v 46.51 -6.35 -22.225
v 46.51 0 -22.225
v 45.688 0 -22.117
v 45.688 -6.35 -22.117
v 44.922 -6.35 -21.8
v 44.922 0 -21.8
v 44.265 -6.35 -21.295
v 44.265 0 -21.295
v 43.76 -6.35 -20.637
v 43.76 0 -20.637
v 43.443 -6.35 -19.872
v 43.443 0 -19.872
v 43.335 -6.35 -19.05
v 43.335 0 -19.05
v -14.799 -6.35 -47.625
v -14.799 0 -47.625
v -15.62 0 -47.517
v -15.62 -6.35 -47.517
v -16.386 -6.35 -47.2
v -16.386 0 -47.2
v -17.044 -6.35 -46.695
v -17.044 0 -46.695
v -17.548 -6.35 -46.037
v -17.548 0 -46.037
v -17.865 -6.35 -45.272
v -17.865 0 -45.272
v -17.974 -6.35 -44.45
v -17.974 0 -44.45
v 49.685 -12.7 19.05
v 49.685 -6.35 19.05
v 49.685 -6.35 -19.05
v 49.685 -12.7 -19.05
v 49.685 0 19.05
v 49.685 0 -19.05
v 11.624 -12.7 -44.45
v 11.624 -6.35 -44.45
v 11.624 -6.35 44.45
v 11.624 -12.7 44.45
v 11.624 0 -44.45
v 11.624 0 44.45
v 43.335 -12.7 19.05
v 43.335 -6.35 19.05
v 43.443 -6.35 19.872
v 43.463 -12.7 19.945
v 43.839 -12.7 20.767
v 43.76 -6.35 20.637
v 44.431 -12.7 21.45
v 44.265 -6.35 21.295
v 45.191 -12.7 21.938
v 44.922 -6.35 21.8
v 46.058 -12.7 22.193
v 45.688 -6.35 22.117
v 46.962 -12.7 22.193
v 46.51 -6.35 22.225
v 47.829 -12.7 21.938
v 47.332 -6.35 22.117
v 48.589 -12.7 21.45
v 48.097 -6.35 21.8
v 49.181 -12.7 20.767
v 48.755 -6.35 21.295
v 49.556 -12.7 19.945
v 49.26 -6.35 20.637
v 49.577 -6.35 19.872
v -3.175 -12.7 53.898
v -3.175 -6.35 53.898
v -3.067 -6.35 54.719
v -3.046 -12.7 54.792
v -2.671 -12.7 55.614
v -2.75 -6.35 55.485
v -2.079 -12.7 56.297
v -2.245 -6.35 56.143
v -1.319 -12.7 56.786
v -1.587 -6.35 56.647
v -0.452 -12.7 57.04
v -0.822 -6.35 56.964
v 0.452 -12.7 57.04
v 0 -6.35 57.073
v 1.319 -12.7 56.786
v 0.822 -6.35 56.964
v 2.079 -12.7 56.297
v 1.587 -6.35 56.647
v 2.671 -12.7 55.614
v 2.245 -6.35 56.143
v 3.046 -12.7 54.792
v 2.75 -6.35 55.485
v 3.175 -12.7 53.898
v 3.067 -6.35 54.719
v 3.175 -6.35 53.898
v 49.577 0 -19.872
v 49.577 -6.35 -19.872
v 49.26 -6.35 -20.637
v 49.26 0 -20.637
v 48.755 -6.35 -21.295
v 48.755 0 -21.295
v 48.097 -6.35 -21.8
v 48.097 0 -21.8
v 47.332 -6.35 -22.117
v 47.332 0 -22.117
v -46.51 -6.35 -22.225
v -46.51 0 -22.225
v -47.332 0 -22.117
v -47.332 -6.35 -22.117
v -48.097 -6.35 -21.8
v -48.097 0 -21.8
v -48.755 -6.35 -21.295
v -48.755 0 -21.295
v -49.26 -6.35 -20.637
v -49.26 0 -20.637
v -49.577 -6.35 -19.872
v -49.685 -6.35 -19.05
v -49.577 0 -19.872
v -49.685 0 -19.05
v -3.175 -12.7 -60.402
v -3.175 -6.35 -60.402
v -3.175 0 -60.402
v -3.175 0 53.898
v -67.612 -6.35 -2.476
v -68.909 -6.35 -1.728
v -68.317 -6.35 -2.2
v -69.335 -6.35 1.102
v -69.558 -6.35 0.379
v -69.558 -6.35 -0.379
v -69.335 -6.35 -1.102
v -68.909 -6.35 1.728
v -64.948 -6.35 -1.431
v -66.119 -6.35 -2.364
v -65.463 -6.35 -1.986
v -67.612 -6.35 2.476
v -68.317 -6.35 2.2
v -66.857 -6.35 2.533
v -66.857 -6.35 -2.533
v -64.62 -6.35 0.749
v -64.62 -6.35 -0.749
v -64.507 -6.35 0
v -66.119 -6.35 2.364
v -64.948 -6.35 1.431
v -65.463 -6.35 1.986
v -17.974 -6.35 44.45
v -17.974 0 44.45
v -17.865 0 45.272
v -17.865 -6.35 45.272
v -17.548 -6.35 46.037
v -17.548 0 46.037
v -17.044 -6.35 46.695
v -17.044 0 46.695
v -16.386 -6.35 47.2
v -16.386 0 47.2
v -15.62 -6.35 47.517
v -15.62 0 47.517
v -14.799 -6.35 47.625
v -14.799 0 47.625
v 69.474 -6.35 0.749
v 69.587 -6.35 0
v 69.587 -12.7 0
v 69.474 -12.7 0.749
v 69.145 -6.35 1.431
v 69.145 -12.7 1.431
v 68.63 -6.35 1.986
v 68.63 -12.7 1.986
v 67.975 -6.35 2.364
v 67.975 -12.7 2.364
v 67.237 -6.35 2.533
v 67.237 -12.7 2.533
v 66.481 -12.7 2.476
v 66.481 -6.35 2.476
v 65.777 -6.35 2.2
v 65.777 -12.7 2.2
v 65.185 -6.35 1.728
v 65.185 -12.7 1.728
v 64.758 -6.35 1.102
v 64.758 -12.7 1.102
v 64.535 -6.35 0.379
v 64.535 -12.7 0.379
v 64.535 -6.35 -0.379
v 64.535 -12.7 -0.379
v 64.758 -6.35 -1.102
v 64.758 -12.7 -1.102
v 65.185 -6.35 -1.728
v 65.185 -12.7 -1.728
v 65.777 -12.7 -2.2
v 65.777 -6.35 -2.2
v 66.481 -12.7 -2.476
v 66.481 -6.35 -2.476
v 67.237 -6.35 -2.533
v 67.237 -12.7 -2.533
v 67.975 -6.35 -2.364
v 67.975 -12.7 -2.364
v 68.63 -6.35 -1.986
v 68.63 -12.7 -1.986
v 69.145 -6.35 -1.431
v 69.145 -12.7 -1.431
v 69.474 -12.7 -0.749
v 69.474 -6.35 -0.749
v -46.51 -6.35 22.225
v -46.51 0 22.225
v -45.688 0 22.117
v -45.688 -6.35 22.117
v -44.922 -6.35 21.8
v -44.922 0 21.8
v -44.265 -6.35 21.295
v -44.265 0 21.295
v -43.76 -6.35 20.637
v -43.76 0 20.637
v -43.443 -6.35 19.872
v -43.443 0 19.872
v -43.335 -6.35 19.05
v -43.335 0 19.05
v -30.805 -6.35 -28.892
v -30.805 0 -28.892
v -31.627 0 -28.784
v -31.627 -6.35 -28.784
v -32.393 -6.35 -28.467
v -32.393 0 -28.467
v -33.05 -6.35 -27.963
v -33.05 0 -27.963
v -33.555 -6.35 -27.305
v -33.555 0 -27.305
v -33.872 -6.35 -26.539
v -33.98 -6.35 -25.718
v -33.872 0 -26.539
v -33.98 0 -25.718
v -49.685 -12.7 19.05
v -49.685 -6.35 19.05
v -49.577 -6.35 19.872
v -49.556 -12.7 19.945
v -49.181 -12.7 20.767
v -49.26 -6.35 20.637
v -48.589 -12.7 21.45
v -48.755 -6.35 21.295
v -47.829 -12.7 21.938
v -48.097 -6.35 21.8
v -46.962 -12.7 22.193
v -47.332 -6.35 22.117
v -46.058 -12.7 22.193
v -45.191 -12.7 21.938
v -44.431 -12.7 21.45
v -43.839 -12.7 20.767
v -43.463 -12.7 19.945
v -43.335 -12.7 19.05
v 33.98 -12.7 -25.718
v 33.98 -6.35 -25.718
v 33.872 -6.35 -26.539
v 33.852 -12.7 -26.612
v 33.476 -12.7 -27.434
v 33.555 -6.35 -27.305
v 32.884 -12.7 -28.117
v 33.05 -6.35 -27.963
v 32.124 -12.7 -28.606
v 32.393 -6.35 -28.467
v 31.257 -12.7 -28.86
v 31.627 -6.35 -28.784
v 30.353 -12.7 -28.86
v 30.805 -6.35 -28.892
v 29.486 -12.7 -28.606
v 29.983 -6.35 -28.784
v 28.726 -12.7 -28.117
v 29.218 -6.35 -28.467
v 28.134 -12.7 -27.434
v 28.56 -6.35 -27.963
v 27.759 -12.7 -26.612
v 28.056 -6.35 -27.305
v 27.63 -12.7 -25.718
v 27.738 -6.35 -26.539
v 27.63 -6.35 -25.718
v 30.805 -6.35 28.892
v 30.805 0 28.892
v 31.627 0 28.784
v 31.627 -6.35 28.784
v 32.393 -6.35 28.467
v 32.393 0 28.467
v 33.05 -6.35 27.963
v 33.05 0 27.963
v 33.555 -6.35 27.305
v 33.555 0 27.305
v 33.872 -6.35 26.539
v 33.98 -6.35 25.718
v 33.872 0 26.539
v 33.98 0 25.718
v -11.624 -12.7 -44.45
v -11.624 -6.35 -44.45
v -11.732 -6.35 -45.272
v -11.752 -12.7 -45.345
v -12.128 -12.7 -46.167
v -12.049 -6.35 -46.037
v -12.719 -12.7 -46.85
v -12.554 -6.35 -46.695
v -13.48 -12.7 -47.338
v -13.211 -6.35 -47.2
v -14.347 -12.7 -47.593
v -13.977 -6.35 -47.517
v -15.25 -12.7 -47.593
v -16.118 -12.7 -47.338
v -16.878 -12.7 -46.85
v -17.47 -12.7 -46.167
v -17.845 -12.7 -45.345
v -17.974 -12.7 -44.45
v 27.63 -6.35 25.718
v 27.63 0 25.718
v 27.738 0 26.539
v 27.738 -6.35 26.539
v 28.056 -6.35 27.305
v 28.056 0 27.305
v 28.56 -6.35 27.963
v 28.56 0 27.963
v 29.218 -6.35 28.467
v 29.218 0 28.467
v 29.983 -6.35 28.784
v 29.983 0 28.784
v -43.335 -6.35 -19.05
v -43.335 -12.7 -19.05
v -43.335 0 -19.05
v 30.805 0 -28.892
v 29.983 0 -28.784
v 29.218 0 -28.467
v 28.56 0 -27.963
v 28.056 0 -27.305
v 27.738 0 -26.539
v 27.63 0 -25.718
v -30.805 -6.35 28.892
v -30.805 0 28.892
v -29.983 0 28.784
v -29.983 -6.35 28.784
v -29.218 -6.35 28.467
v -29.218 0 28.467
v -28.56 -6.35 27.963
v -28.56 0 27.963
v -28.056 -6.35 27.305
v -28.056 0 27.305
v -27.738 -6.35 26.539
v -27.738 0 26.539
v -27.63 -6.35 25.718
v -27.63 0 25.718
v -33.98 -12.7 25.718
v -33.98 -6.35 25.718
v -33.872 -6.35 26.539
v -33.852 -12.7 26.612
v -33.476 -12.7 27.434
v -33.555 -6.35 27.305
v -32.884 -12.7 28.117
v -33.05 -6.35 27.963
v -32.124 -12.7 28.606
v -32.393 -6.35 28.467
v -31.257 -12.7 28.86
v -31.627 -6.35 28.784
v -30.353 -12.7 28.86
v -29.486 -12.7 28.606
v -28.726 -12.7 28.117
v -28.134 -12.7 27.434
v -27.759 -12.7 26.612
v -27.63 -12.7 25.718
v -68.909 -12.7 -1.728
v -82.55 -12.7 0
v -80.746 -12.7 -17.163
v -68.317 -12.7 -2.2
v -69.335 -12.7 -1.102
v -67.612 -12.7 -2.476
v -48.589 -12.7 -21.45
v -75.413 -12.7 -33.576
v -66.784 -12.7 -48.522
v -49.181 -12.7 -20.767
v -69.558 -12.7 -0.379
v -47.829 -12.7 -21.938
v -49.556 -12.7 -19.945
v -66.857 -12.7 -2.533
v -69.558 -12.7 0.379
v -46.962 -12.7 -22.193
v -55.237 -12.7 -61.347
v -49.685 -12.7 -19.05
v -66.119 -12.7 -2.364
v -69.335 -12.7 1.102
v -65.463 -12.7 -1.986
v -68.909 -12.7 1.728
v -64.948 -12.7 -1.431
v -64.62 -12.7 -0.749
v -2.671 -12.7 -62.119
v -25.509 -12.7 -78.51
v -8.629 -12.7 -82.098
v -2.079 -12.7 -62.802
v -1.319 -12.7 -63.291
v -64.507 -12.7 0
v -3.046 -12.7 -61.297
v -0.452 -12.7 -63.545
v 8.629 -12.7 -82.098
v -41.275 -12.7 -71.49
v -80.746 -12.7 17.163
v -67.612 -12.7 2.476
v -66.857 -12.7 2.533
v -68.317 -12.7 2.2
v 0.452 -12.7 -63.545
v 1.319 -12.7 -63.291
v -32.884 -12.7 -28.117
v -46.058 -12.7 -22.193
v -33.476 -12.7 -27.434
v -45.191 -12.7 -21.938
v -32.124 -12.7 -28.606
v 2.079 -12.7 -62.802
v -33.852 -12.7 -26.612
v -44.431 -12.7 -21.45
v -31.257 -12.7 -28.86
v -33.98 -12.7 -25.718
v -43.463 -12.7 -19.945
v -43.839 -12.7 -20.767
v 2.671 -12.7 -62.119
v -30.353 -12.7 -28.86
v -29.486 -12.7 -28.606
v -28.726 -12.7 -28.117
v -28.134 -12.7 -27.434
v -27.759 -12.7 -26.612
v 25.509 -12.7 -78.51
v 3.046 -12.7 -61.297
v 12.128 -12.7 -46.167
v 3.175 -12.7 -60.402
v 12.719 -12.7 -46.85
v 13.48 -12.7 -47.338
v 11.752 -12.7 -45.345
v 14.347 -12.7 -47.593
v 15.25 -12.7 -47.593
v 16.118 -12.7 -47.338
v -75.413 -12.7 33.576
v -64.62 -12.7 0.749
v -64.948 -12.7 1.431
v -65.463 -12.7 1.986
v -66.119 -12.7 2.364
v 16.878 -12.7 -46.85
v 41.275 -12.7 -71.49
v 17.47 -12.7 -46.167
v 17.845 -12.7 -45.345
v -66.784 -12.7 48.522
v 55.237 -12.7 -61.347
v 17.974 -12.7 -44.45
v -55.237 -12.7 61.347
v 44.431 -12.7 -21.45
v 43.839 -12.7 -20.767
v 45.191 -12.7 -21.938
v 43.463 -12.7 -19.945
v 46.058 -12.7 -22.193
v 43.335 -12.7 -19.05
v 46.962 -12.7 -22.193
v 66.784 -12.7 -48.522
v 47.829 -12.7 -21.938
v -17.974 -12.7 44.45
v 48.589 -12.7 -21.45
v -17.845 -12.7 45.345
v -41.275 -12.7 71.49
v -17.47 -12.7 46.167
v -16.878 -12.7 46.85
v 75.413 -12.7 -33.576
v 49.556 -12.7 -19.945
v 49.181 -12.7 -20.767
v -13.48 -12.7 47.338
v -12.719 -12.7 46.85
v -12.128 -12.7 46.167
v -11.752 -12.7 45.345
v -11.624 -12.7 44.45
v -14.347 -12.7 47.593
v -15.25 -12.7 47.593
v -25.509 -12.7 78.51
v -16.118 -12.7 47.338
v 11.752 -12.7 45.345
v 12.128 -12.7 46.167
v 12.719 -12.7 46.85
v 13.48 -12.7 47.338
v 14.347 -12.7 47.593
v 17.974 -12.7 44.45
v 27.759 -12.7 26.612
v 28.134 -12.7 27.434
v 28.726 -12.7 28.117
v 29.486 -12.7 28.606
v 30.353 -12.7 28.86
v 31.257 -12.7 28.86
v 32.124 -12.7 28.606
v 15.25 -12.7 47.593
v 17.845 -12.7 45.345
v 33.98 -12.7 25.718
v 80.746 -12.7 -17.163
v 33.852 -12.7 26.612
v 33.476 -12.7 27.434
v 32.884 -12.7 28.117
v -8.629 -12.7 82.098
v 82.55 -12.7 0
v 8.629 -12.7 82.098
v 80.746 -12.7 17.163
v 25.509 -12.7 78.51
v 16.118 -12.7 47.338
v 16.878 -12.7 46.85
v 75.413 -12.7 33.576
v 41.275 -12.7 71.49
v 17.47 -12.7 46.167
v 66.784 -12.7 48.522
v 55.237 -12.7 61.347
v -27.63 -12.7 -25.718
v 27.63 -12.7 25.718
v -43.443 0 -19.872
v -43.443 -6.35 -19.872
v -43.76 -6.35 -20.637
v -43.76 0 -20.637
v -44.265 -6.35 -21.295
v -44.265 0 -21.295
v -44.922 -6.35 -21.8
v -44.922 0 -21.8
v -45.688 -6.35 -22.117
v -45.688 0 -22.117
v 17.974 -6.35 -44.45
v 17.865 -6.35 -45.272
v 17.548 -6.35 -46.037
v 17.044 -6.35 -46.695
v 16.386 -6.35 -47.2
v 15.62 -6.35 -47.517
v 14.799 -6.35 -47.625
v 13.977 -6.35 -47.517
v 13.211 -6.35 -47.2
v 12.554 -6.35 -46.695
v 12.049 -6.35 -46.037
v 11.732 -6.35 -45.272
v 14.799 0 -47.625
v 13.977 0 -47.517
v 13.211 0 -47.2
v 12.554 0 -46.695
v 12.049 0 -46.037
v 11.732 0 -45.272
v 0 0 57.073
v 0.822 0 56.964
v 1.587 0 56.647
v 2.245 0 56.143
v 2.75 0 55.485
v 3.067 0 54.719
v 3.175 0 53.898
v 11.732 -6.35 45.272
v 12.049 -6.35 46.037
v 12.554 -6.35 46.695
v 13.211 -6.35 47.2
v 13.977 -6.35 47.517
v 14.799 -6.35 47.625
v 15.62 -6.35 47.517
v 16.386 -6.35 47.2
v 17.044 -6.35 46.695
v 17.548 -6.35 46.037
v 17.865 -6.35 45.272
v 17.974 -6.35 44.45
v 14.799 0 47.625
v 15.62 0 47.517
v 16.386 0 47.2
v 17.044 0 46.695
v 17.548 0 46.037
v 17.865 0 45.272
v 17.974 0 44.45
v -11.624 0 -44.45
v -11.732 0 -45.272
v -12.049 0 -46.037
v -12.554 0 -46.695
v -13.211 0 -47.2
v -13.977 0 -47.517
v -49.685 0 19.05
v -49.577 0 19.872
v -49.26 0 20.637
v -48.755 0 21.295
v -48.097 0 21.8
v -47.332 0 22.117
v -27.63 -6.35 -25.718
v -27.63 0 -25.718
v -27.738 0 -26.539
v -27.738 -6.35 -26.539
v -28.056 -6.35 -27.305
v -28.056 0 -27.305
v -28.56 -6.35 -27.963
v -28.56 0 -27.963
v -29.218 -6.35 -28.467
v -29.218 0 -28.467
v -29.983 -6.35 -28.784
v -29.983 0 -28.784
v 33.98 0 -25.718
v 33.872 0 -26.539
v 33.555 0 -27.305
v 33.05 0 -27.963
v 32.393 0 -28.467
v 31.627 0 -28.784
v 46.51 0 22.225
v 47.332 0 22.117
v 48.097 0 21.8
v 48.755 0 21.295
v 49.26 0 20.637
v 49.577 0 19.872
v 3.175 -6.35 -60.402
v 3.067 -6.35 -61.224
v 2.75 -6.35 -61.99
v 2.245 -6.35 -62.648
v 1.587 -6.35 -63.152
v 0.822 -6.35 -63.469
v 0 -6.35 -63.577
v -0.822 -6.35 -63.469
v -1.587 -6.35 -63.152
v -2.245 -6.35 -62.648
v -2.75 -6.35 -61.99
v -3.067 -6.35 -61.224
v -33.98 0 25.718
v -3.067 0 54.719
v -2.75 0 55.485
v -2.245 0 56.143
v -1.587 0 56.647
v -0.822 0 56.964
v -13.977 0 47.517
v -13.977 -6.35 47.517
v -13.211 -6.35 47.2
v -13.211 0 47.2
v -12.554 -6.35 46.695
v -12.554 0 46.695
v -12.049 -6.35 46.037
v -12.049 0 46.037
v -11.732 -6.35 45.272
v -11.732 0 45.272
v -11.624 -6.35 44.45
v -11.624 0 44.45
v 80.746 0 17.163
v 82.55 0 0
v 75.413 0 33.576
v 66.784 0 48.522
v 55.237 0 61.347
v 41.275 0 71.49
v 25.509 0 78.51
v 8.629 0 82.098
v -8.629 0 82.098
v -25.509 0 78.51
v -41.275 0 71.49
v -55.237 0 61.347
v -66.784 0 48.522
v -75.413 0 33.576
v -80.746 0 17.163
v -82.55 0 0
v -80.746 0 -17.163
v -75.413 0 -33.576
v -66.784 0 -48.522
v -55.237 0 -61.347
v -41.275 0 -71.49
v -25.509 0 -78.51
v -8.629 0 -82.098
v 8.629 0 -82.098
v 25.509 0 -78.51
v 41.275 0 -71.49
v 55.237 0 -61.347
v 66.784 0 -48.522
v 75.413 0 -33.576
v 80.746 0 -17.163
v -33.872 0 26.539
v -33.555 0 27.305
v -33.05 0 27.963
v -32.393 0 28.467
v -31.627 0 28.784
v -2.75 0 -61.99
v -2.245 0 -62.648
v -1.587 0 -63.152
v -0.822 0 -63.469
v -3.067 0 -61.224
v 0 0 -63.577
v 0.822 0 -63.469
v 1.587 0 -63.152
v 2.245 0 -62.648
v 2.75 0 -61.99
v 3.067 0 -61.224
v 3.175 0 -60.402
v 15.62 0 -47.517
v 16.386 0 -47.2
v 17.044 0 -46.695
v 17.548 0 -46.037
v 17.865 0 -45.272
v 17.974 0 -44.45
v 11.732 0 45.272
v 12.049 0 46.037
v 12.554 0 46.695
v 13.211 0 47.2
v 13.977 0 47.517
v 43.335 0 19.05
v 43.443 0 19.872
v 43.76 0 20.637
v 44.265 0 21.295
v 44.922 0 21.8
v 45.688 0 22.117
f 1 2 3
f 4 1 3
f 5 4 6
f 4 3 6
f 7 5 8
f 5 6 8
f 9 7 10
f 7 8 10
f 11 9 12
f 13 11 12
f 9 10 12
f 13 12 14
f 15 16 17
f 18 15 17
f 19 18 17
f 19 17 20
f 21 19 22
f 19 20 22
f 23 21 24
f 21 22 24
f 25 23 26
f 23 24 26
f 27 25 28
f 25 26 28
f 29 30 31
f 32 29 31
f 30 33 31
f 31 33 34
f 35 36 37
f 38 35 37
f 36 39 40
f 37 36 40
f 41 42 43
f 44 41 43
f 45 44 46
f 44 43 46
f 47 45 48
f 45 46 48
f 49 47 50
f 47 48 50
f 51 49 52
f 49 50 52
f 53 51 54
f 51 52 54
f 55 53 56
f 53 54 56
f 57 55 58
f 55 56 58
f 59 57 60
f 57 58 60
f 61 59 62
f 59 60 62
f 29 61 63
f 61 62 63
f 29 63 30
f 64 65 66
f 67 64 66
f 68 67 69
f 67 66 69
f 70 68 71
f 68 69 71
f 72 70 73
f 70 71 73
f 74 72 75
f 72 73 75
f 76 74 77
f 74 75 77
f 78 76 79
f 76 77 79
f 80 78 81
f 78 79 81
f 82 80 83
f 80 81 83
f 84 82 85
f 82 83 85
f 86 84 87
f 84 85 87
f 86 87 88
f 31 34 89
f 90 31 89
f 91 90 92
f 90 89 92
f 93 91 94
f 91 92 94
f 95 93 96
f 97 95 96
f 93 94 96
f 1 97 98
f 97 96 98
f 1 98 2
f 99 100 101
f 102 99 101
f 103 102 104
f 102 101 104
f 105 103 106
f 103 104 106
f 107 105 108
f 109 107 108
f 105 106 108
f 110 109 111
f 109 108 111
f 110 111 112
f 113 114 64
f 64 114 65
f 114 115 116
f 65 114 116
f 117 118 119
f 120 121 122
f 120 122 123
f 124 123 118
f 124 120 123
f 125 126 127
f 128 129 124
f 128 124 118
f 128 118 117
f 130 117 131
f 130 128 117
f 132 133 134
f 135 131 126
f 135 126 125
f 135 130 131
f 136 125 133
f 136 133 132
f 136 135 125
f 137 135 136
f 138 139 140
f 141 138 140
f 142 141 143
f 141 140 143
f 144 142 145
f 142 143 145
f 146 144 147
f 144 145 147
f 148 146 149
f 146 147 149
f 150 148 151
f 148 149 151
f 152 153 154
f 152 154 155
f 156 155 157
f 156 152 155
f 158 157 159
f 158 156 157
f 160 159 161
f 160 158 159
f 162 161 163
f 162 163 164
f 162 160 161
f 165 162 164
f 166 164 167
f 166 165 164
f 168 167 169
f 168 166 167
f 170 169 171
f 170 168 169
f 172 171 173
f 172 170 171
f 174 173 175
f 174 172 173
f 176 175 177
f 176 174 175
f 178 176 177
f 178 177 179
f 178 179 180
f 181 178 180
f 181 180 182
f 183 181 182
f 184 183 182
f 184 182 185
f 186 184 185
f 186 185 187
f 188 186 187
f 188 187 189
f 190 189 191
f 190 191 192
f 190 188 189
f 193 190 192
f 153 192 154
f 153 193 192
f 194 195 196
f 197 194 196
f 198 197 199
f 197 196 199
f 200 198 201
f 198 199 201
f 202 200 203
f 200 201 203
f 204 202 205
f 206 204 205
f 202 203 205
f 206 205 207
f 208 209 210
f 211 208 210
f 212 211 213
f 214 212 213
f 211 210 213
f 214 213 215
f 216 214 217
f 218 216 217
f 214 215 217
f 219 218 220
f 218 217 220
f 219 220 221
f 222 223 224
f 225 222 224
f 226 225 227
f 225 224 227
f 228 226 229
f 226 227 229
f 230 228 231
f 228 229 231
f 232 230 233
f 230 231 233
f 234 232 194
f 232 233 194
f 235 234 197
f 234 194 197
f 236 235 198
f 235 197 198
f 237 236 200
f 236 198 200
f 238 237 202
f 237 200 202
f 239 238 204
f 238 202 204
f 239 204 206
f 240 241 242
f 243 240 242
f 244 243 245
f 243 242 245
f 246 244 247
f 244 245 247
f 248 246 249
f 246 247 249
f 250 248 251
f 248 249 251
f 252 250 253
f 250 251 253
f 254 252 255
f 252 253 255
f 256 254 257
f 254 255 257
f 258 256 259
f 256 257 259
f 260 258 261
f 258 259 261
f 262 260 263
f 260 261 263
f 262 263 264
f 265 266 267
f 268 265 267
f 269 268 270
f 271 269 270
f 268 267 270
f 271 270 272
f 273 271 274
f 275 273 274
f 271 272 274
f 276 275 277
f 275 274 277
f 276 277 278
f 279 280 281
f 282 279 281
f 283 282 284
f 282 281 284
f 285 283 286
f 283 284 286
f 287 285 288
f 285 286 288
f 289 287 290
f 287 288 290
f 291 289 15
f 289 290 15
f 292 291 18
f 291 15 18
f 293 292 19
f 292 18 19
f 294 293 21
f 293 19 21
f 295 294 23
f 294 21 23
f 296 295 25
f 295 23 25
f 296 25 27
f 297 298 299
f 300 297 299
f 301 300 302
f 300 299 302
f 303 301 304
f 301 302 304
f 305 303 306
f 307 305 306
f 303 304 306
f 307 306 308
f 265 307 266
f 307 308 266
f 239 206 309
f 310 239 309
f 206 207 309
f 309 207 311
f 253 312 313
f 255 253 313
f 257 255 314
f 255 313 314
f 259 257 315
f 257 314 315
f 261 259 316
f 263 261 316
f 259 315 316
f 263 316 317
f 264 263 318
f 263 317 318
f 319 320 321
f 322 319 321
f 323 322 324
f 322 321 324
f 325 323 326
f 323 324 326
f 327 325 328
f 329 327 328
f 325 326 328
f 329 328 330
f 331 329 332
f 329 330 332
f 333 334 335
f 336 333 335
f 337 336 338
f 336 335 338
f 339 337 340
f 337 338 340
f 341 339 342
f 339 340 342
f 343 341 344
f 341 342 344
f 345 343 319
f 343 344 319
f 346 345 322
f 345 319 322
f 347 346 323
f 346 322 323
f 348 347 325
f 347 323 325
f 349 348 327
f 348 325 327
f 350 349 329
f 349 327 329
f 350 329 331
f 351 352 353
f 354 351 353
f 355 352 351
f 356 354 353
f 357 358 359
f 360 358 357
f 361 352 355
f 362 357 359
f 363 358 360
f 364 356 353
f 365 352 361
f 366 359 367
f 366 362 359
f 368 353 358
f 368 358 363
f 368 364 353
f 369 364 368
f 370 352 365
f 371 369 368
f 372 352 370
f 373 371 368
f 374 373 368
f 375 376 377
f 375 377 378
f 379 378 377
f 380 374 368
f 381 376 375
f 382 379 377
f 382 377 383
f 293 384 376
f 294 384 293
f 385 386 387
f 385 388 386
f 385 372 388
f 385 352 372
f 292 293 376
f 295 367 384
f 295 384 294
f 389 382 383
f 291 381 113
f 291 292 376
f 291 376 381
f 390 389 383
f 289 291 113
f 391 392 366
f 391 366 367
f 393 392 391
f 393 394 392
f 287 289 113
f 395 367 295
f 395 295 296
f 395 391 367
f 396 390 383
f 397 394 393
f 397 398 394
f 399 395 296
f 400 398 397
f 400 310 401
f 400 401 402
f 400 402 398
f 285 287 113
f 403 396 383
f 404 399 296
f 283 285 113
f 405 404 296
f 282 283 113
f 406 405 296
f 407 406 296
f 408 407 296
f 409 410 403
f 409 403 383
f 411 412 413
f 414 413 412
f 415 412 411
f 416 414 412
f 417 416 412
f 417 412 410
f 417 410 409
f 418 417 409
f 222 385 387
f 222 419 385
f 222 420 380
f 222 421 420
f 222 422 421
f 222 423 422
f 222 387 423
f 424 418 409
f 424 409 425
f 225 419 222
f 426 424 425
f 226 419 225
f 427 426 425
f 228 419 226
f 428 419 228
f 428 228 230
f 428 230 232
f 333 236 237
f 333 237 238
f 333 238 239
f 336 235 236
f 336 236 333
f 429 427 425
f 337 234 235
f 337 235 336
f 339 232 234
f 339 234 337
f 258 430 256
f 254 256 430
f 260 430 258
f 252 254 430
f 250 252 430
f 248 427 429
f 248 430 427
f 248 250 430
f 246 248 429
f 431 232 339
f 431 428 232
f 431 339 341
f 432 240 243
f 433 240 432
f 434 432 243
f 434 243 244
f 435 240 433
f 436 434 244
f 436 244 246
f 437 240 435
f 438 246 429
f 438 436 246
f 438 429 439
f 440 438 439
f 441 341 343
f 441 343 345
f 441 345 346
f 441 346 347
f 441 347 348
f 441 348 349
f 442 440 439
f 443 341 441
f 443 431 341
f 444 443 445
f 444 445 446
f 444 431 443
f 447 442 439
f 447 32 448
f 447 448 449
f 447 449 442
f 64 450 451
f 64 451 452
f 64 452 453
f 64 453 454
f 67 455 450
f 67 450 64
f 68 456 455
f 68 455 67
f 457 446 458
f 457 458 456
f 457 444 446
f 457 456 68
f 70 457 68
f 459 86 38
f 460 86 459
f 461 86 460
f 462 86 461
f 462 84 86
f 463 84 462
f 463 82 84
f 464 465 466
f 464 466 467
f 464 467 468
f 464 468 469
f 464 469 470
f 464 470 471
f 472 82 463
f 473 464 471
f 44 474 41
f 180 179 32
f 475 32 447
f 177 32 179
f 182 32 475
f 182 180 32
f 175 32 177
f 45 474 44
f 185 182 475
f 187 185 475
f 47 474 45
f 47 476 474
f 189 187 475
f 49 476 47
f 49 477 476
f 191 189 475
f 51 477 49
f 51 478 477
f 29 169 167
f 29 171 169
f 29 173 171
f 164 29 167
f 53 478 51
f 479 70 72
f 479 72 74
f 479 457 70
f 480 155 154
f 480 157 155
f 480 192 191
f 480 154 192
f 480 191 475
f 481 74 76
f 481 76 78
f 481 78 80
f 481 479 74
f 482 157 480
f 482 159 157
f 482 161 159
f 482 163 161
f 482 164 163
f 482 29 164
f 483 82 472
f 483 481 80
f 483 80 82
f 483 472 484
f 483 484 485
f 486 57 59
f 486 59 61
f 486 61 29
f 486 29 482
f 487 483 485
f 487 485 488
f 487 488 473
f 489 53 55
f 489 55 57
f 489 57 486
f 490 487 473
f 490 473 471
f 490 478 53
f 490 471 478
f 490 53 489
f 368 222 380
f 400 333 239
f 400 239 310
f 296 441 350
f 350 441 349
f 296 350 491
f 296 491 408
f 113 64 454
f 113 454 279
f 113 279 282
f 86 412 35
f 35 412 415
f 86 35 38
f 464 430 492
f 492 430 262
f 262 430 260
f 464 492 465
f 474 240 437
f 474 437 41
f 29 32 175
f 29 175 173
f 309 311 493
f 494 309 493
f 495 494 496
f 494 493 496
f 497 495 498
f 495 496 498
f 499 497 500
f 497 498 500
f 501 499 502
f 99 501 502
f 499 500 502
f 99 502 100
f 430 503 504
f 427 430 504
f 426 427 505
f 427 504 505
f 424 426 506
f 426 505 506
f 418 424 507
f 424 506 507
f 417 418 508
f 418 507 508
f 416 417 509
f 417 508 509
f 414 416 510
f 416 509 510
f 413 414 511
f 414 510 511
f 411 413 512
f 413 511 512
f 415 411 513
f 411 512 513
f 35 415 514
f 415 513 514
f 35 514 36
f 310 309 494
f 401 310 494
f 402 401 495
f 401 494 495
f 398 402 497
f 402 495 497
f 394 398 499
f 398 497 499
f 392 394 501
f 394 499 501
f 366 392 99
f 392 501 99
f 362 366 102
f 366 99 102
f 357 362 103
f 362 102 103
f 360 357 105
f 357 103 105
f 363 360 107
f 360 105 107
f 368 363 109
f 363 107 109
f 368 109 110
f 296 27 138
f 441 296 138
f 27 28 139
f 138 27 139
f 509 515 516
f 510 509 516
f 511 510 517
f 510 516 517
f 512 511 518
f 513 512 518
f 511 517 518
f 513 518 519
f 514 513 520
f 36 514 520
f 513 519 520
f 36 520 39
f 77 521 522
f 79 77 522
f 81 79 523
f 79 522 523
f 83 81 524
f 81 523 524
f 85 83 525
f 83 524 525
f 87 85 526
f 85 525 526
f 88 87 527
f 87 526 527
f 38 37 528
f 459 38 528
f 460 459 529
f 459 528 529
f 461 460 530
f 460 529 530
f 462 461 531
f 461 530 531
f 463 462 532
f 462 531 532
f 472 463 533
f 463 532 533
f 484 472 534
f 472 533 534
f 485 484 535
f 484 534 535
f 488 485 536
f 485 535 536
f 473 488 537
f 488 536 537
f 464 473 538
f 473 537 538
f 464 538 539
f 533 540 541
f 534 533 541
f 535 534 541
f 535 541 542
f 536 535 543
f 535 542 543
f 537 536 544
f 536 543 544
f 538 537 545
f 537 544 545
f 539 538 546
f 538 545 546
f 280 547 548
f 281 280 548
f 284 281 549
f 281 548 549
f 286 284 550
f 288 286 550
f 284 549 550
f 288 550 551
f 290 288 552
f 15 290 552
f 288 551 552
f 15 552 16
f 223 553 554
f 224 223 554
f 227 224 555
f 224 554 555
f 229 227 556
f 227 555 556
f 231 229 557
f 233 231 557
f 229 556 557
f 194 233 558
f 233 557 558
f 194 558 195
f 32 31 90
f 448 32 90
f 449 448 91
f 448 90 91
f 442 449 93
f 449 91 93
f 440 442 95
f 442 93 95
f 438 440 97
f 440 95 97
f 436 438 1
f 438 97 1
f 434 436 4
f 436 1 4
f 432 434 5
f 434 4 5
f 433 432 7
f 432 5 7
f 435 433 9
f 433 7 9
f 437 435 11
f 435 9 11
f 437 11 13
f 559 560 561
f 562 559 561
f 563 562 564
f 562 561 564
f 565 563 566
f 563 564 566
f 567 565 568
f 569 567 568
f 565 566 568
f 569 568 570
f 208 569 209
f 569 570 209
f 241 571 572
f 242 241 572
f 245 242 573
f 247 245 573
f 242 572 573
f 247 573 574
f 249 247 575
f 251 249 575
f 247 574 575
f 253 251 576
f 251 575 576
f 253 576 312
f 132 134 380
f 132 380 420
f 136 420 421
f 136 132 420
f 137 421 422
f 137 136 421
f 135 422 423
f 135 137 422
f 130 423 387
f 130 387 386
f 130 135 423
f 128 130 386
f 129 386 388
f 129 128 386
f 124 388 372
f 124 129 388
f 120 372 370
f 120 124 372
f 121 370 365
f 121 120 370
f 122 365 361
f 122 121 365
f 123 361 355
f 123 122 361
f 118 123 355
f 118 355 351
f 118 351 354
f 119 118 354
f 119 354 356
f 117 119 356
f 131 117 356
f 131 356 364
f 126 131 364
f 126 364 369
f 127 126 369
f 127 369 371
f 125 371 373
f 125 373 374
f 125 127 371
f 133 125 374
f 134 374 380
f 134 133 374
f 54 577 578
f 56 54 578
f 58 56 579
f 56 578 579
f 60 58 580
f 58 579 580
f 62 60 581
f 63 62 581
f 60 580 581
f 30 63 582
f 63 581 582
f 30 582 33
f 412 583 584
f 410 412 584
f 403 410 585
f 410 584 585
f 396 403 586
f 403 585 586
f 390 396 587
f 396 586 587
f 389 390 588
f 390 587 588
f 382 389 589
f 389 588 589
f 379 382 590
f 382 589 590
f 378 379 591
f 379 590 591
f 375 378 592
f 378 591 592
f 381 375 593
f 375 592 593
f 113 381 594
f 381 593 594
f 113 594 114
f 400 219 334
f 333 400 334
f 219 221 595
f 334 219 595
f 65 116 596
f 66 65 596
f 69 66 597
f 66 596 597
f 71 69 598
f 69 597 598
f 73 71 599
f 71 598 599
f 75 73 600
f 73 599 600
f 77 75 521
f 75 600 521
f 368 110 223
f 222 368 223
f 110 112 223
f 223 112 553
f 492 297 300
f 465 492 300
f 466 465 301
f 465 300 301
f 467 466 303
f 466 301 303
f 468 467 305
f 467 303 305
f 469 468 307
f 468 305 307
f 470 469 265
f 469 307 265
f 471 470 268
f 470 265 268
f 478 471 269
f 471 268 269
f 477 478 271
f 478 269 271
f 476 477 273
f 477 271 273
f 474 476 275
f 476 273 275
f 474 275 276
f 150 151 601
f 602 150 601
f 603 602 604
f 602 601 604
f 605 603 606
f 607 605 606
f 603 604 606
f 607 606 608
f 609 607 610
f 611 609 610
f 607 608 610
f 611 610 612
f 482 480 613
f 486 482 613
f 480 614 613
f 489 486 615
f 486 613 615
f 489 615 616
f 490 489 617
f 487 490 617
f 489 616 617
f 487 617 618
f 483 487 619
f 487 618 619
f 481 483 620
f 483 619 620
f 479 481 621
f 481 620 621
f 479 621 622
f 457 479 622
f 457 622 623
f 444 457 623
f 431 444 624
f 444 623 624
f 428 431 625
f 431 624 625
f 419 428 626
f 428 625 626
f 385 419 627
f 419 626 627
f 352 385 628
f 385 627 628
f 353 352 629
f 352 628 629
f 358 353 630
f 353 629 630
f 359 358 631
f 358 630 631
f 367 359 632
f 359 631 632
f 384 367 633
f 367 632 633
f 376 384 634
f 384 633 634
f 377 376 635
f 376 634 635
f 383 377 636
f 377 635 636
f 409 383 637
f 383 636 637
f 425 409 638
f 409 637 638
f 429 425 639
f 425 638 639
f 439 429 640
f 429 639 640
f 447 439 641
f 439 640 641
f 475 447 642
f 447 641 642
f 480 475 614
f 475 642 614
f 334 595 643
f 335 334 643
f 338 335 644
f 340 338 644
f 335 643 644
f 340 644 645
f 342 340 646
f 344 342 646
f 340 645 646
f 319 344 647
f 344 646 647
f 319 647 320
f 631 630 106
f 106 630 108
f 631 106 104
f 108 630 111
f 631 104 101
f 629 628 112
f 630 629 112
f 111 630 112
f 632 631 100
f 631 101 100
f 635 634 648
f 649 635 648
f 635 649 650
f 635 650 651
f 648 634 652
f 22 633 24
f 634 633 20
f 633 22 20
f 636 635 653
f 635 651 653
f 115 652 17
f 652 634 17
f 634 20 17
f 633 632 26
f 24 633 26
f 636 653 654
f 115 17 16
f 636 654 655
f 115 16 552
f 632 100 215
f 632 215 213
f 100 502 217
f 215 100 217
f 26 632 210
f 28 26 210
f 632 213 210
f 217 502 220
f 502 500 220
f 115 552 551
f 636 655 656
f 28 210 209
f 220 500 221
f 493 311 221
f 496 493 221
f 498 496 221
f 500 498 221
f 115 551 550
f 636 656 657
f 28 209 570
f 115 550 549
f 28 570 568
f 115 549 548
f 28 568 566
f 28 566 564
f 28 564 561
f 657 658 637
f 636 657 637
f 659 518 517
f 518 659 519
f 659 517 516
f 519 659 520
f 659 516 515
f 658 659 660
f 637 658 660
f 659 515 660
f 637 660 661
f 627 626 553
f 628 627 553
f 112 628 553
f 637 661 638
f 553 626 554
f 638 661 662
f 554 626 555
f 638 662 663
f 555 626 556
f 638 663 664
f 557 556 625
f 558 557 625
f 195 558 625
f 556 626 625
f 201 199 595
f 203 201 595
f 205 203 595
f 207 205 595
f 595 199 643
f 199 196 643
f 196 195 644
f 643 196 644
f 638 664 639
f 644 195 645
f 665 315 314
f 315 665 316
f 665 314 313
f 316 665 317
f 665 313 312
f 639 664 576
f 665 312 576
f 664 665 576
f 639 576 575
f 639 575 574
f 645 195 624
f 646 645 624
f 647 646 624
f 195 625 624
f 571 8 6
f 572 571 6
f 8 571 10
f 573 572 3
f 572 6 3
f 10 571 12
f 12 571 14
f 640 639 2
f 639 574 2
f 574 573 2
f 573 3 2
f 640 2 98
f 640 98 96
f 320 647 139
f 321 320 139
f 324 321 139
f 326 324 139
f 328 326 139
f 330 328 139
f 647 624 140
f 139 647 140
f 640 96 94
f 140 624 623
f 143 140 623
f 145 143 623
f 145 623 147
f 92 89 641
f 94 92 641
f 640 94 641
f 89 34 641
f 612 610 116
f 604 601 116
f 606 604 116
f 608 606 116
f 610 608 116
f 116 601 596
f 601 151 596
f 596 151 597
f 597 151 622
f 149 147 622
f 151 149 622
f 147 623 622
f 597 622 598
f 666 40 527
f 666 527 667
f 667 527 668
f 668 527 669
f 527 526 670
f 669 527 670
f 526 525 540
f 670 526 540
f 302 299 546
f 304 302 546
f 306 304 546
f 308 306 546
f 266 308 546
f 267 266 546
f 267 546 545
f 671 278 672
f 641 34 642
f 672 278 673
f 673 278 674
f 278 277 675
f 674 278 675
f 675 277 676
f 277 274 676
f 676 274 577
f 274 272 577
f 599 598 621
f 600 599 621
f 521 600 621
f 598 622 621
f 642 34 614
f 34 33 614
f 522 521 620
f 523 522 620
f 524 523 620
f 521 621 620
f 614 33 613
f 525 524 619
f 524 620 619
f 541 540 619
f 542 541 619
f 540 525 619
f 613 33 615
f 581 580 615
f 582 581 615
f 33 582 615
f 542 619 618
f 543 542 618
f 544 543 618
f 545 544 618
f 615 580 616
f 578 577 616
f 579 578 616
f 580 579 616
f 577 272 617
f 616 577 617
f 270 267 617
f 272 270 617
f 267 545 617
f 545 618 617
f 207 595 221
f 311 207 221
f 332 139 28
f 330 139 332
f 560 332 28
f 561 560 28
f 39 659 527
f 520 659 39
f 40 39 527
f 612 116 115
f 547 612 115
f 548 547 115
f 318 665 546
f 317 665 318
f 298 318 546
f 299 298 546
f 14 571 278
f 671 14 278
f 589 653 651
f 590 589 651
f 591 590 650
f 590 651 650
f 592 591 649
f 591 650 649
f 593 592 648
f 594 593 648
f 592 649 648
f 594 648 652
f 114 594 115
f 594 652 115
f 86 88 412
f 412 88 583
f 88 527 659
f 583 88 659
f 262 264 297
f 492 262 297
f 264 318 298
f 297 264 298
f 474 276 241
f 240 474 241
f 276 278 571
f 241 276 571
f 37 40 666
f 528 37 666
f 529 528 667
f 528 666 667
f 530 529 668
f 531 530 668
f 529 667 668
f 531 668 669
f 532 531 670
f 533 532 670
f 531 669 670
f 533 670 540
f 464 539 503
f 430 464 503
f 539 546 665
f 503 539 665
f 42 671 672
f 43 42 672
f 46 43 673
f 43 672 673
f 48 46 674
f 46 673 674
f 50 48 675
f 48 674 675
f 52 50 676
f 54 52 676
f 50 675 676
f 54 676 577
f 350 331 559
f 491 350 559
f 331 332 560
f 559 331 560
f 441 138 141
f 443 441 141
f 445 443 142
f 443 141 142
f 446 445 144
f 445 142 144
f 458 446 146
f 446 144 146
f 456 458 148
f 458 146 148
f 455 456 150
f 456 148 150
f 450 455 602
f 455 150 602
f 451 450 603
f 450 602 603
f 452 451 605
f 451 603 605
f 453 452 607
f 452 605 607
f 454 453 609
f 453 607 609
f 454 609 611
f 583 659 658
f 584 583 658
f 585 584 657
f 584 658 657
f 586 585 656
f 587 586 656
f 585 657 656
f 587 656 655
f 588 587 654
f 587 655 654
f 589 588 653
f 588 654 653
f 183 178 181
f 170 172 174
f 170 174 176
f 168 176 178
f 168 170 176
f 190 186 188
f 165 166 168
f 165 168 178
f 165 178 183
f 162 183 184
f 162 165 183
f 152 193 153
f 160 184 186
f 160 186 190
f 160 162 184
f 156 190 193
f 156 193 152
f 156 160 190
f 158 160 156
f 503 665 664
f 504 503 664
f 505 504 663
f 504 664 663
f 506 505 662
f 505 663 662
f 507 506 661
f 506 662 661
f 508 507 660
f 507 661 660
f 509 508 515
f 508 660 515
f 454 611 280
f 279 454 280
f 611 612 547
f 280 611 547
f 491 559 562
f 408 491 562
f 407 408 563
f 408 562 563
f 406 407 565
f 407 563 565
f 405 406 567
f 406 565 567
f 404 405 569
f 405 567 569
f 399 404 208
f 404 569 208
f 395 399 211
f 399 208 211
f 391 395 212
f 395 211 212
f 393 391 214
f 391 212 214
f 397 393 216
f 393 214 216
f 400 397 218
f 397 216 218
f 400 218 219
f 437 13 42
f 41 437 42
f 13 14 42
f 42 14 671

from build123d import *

# Parameters (mm, degrees)
F0_R     = 82.55
F1_DEPTH = 6.35
F2_R     = 82.55
F2_R_2   = 2.54
F3_DEPTH = 6.35


with BuildPart() as f1:
    # F0 (on Front) → F1 (new body)
    with BuildSketch(Plane.XZ):
        Circle(F0_R)
        with BuildLine():
            Line((3.175, 53.897562), (3.175, -60.402438))
            ThreePointArc((3.175, -60.402438), (2.245064, -62.647502), (0, -63.577438))
            ThreePointArc((0, -63.577438), (-2.245064, -62.647502), (-3.175, -60.402438))
            Line((-3.175, -60.402438), (-3.175, 53.897562))
            ThreePointArc((-3.175, 53.897562), (-2.245064, 56.142626), (0, 57.072562))
            ThreePointArc((0, 57.072562), (2.245064, 56.142626), (3.175, 53.897562))
        make_face(mode=Mode.SUBTRACT)
        with BuildLine():
            Line((-49.684873, -19.05), (-49.684873, 19.05))
            ThreePointArc((-49.684873, 19.05), (-48.754937, 21.295064), (-46.509873, 22.225))
            ThreePointArc((-46.509873, 22.225), (-44.264809, 21.295064), (-43.334873, 19.05))
            Line((-43.334873, 19.05), (-43.334873, -19.05))
            ThreePointArc((-43.334873, -19.05), (-44.264809, -21.295064), (-46.509873, -22.225))
            ThreePointArc((-46.509873, -22.225), (-48.754937, -21.295064), (-49.684873, -19.05))
        make_face(mode=Mode.SUBTRACT)
        with BuildLine():
            Line((-33.980241, -25.7175), (-33.980241, 25.7175))
            ThreePointArc((-33.980241, 25.7175), (-33.050305, 27.962564), (-30.805241, 28.8925))
            ThreePointArc((-30.805241, 28.8925), (-28.560177, 27.962564), (-27.630241, 25.7175))
            Line((-27.630241, 25.7175), (-27.630241, -25.7175))
            ThreePointArc((-27.630241, -25.7175), (-28.560177, -27.962564), (-30.805241, -28.8925))
            ThreePointArc((-30.805241, -28.8925), (-33.050305, -27.962564), (-33.980241, -25.7175))
        make_face(mode=Mode.SUBTRACT)
        with BuildLine():
            Line((-17.973594, -44.45), (-17.973594, 44.45))
            ThreePointArc((-17.973594, 44.45), (-17.043658, 46.695064), (-14.798594, 47.625))
            ThreePointArc((-14.798594, 47.625), (-12.55353, 46.695064), (-11.623594, 44.45))
            Line((-11.623594, 44.45), (-11.623594, -44.45))
            ThreePointArc((-11.623594, -44.45), (-12.55353, -46.695064), (-14.798594, -47.625))
            ThreePointArc((-14.798594, -47.625), (-17.043658, -46.695064), (-17.973594, -44.45))
        make_face(mode=Mode.SUBTRACT)
        with BuildLine():
            ThreePointArc((11.623594, 44.45), (12.55353, 46.695064), (14.798594, 47.625))
            ThreePointArc((14.798594, 47.625), (17.043658, 46.695064), (17.973594, 44.45))
            Line((17.973594, 44.45), (17.973594, -44.45))
            ThreePointArc((17.973594, -44.45), (17.043658, -46.695064), (14.798594, -47.625))
            ThreePointArc((14.798594, -47.625), (12.55353, -46.695064), (11.623594, -44.45))
            Line((11.623594, -44.45), (11.623594, 44.45))
        make_face(mode=Mode.SUBTRACT)
        with BuildLine():
            ThreePointArc((33.980241, -25.7175), (33.050305, -27.962564), (30.805241, -28.8925))
            ThreePointArc((30.805241, -28.8925), (28.560177, -27.962564), (27.630241, -25.7175))
            Line((27.630241, -25.7175), (27.630241, 25.7175))
            ThreePointArc((27.630241, 25.7175), (28.560177, 27.962564), (30.805241, 28.8925))
            ThreePointArc((30.805241, 28.8925), (33.050305, 27.962564), (33.980241, 25.7175))
            Line((33.980241, 25.7175), (33.980241, -25.7175))
        make_face(mode=Mode.SUBTRACT)
        with BuildLine():
            ThreePointArc((43.334873, 19.05), (44.264809, 21.295064), (46.509873, 22.225))
            ThreePointArc((46.509873, 22.225), (48.754937, 21.295064), (49.684873, 19.05))
            Line((49.684873, 19.05), (49.684873, -19.05))
            ThreePointArc((49.684873, -19.05), (48.754937, -21.295064), (46.509873, -22.225))
            ThreePointArc((46.509873, -22.225), (44.264809, -21.295064), (43.334873, -19.05))
            Line((43.334873, -19.05), (43.334873, 19.05))
        make_face(mode=Mode.SUBTRACT)
    extrude(amount=F1_DEPTH)

    # F2 (on face) → F3 (join)
    with BuildSketch(Plane.XZ.offset(6.35)):
        Circle(F2_R)
        with BuildLine():
            Line((-3.175, -60.402438), (-3.175, 53.897562))
            ThreePointArc((-3.175, 53.897562), (0, 57.072562), (3.175, 53.897562))
            Line((3.175, 53.897562), (3.175, -60.402438))
            ThreePointArc((3.175, -60.402438), (0, -63.577438), (-3.175, -60.402438))
        make_face(mode=Mode.SUBTRACT)
        with Locations((-67.046702, 0)):
            Circle(F2_R_2, mode=Mode.SUBTRACT)
        with BuildLine():
            Line((-43.334873, 19.05), (-43.334873, -19.05))
            ThreePointArc((-43.334873, -19.05), (-46.509873, -22.225), (-49.684873, -19.05))
            Line((-49.684873, -19.05), (-49.684873, 19.05))
            ThreePointArc((-49.684873, 19.05), (-46.509873, 22.225), (-43.334873, 19.05))
        make_face(mode=Mode.SUBTRACT)
        with BuildLine():
            Line((-27.630241, 25.7175), (-27.630241, -25.7175))
            ThreePointArc((-27.630241, -25.7175), (-30.805241, -28.8925), (-33.980241, -25.7175))
            Line((-33.980241, -25.7175), (-33.980241, 25.7175))
            ThreePointArc((-33.980241, 25.7175), (-30.805241, 28.8925), (-27.630241, 25.7175))
        make_face(mode=Mode.SUBTRACT)
        with BuildLine():
            Line((-11.623594, 44.45), (-11.623594, -44.45))
            ThreePointArc((-11.623594, -44.45), (-14.798594, -47.625), (-17.973594, -44.45))
            Line((-17.973594, -44.45), (-17.973594, 44.45))
            ThreePointArc((-17.973594, 44.45), (-14.798594, 47.625), (-11.623594, 44.45))
        make_face(mode=Mode.SUBTRACT)
        with BuildLine():
            ThreePointArc((17.973594, -44.45), (14.798594, -47.625), (11.623594, -44.45))
            Line((11.623594, -44.45), (11.623594, 44.45))
            ThreePointArc((11.623594, 44.45), (14.798594, 47.625), (17.973594, 44.45))
            Line((17.973594, 44.45), (17.973594, -44.45))
        make_face(mode=Mode.SUBTRACT)
        with BuildLine():
            ThreePointArc((27.630241, 25.7175), (30.805241, 28.8925), (33.980241, 25.7175))
            Line((33.980241, 25.7175), (33.980241, -25.7175))
            ThreePointArc((33.980241, -25.7175), (30.805241, -28.8925), (27.630241, -25.7175))
            Line((27.630241, -25.7175), (27.630241, 25.7175))
        make_face(mode=Mode.SUBTRACT)
        with BuildLine():
            ThreePointArc((49.684873, -19.05), (46.509873, -22.225), (43.334873, -19.05))
            Line((43.334873, -19.05), (43.334873, 19.05))
            ThreePointArc((43.334873, 19.05), (46.509873, 22.225), (49.684873, 19.05))
            Line((49.684873, 19.05), (49.684873, -19.05))
        make_face(mode=Mode.SUBTRACT)
        with Locations((67.046702, 0)):
            Circle(F2_R_2, mode=Mode.SUBTRACT)
    extrude(amount=F3_DEPTH)


solid = f1.part
